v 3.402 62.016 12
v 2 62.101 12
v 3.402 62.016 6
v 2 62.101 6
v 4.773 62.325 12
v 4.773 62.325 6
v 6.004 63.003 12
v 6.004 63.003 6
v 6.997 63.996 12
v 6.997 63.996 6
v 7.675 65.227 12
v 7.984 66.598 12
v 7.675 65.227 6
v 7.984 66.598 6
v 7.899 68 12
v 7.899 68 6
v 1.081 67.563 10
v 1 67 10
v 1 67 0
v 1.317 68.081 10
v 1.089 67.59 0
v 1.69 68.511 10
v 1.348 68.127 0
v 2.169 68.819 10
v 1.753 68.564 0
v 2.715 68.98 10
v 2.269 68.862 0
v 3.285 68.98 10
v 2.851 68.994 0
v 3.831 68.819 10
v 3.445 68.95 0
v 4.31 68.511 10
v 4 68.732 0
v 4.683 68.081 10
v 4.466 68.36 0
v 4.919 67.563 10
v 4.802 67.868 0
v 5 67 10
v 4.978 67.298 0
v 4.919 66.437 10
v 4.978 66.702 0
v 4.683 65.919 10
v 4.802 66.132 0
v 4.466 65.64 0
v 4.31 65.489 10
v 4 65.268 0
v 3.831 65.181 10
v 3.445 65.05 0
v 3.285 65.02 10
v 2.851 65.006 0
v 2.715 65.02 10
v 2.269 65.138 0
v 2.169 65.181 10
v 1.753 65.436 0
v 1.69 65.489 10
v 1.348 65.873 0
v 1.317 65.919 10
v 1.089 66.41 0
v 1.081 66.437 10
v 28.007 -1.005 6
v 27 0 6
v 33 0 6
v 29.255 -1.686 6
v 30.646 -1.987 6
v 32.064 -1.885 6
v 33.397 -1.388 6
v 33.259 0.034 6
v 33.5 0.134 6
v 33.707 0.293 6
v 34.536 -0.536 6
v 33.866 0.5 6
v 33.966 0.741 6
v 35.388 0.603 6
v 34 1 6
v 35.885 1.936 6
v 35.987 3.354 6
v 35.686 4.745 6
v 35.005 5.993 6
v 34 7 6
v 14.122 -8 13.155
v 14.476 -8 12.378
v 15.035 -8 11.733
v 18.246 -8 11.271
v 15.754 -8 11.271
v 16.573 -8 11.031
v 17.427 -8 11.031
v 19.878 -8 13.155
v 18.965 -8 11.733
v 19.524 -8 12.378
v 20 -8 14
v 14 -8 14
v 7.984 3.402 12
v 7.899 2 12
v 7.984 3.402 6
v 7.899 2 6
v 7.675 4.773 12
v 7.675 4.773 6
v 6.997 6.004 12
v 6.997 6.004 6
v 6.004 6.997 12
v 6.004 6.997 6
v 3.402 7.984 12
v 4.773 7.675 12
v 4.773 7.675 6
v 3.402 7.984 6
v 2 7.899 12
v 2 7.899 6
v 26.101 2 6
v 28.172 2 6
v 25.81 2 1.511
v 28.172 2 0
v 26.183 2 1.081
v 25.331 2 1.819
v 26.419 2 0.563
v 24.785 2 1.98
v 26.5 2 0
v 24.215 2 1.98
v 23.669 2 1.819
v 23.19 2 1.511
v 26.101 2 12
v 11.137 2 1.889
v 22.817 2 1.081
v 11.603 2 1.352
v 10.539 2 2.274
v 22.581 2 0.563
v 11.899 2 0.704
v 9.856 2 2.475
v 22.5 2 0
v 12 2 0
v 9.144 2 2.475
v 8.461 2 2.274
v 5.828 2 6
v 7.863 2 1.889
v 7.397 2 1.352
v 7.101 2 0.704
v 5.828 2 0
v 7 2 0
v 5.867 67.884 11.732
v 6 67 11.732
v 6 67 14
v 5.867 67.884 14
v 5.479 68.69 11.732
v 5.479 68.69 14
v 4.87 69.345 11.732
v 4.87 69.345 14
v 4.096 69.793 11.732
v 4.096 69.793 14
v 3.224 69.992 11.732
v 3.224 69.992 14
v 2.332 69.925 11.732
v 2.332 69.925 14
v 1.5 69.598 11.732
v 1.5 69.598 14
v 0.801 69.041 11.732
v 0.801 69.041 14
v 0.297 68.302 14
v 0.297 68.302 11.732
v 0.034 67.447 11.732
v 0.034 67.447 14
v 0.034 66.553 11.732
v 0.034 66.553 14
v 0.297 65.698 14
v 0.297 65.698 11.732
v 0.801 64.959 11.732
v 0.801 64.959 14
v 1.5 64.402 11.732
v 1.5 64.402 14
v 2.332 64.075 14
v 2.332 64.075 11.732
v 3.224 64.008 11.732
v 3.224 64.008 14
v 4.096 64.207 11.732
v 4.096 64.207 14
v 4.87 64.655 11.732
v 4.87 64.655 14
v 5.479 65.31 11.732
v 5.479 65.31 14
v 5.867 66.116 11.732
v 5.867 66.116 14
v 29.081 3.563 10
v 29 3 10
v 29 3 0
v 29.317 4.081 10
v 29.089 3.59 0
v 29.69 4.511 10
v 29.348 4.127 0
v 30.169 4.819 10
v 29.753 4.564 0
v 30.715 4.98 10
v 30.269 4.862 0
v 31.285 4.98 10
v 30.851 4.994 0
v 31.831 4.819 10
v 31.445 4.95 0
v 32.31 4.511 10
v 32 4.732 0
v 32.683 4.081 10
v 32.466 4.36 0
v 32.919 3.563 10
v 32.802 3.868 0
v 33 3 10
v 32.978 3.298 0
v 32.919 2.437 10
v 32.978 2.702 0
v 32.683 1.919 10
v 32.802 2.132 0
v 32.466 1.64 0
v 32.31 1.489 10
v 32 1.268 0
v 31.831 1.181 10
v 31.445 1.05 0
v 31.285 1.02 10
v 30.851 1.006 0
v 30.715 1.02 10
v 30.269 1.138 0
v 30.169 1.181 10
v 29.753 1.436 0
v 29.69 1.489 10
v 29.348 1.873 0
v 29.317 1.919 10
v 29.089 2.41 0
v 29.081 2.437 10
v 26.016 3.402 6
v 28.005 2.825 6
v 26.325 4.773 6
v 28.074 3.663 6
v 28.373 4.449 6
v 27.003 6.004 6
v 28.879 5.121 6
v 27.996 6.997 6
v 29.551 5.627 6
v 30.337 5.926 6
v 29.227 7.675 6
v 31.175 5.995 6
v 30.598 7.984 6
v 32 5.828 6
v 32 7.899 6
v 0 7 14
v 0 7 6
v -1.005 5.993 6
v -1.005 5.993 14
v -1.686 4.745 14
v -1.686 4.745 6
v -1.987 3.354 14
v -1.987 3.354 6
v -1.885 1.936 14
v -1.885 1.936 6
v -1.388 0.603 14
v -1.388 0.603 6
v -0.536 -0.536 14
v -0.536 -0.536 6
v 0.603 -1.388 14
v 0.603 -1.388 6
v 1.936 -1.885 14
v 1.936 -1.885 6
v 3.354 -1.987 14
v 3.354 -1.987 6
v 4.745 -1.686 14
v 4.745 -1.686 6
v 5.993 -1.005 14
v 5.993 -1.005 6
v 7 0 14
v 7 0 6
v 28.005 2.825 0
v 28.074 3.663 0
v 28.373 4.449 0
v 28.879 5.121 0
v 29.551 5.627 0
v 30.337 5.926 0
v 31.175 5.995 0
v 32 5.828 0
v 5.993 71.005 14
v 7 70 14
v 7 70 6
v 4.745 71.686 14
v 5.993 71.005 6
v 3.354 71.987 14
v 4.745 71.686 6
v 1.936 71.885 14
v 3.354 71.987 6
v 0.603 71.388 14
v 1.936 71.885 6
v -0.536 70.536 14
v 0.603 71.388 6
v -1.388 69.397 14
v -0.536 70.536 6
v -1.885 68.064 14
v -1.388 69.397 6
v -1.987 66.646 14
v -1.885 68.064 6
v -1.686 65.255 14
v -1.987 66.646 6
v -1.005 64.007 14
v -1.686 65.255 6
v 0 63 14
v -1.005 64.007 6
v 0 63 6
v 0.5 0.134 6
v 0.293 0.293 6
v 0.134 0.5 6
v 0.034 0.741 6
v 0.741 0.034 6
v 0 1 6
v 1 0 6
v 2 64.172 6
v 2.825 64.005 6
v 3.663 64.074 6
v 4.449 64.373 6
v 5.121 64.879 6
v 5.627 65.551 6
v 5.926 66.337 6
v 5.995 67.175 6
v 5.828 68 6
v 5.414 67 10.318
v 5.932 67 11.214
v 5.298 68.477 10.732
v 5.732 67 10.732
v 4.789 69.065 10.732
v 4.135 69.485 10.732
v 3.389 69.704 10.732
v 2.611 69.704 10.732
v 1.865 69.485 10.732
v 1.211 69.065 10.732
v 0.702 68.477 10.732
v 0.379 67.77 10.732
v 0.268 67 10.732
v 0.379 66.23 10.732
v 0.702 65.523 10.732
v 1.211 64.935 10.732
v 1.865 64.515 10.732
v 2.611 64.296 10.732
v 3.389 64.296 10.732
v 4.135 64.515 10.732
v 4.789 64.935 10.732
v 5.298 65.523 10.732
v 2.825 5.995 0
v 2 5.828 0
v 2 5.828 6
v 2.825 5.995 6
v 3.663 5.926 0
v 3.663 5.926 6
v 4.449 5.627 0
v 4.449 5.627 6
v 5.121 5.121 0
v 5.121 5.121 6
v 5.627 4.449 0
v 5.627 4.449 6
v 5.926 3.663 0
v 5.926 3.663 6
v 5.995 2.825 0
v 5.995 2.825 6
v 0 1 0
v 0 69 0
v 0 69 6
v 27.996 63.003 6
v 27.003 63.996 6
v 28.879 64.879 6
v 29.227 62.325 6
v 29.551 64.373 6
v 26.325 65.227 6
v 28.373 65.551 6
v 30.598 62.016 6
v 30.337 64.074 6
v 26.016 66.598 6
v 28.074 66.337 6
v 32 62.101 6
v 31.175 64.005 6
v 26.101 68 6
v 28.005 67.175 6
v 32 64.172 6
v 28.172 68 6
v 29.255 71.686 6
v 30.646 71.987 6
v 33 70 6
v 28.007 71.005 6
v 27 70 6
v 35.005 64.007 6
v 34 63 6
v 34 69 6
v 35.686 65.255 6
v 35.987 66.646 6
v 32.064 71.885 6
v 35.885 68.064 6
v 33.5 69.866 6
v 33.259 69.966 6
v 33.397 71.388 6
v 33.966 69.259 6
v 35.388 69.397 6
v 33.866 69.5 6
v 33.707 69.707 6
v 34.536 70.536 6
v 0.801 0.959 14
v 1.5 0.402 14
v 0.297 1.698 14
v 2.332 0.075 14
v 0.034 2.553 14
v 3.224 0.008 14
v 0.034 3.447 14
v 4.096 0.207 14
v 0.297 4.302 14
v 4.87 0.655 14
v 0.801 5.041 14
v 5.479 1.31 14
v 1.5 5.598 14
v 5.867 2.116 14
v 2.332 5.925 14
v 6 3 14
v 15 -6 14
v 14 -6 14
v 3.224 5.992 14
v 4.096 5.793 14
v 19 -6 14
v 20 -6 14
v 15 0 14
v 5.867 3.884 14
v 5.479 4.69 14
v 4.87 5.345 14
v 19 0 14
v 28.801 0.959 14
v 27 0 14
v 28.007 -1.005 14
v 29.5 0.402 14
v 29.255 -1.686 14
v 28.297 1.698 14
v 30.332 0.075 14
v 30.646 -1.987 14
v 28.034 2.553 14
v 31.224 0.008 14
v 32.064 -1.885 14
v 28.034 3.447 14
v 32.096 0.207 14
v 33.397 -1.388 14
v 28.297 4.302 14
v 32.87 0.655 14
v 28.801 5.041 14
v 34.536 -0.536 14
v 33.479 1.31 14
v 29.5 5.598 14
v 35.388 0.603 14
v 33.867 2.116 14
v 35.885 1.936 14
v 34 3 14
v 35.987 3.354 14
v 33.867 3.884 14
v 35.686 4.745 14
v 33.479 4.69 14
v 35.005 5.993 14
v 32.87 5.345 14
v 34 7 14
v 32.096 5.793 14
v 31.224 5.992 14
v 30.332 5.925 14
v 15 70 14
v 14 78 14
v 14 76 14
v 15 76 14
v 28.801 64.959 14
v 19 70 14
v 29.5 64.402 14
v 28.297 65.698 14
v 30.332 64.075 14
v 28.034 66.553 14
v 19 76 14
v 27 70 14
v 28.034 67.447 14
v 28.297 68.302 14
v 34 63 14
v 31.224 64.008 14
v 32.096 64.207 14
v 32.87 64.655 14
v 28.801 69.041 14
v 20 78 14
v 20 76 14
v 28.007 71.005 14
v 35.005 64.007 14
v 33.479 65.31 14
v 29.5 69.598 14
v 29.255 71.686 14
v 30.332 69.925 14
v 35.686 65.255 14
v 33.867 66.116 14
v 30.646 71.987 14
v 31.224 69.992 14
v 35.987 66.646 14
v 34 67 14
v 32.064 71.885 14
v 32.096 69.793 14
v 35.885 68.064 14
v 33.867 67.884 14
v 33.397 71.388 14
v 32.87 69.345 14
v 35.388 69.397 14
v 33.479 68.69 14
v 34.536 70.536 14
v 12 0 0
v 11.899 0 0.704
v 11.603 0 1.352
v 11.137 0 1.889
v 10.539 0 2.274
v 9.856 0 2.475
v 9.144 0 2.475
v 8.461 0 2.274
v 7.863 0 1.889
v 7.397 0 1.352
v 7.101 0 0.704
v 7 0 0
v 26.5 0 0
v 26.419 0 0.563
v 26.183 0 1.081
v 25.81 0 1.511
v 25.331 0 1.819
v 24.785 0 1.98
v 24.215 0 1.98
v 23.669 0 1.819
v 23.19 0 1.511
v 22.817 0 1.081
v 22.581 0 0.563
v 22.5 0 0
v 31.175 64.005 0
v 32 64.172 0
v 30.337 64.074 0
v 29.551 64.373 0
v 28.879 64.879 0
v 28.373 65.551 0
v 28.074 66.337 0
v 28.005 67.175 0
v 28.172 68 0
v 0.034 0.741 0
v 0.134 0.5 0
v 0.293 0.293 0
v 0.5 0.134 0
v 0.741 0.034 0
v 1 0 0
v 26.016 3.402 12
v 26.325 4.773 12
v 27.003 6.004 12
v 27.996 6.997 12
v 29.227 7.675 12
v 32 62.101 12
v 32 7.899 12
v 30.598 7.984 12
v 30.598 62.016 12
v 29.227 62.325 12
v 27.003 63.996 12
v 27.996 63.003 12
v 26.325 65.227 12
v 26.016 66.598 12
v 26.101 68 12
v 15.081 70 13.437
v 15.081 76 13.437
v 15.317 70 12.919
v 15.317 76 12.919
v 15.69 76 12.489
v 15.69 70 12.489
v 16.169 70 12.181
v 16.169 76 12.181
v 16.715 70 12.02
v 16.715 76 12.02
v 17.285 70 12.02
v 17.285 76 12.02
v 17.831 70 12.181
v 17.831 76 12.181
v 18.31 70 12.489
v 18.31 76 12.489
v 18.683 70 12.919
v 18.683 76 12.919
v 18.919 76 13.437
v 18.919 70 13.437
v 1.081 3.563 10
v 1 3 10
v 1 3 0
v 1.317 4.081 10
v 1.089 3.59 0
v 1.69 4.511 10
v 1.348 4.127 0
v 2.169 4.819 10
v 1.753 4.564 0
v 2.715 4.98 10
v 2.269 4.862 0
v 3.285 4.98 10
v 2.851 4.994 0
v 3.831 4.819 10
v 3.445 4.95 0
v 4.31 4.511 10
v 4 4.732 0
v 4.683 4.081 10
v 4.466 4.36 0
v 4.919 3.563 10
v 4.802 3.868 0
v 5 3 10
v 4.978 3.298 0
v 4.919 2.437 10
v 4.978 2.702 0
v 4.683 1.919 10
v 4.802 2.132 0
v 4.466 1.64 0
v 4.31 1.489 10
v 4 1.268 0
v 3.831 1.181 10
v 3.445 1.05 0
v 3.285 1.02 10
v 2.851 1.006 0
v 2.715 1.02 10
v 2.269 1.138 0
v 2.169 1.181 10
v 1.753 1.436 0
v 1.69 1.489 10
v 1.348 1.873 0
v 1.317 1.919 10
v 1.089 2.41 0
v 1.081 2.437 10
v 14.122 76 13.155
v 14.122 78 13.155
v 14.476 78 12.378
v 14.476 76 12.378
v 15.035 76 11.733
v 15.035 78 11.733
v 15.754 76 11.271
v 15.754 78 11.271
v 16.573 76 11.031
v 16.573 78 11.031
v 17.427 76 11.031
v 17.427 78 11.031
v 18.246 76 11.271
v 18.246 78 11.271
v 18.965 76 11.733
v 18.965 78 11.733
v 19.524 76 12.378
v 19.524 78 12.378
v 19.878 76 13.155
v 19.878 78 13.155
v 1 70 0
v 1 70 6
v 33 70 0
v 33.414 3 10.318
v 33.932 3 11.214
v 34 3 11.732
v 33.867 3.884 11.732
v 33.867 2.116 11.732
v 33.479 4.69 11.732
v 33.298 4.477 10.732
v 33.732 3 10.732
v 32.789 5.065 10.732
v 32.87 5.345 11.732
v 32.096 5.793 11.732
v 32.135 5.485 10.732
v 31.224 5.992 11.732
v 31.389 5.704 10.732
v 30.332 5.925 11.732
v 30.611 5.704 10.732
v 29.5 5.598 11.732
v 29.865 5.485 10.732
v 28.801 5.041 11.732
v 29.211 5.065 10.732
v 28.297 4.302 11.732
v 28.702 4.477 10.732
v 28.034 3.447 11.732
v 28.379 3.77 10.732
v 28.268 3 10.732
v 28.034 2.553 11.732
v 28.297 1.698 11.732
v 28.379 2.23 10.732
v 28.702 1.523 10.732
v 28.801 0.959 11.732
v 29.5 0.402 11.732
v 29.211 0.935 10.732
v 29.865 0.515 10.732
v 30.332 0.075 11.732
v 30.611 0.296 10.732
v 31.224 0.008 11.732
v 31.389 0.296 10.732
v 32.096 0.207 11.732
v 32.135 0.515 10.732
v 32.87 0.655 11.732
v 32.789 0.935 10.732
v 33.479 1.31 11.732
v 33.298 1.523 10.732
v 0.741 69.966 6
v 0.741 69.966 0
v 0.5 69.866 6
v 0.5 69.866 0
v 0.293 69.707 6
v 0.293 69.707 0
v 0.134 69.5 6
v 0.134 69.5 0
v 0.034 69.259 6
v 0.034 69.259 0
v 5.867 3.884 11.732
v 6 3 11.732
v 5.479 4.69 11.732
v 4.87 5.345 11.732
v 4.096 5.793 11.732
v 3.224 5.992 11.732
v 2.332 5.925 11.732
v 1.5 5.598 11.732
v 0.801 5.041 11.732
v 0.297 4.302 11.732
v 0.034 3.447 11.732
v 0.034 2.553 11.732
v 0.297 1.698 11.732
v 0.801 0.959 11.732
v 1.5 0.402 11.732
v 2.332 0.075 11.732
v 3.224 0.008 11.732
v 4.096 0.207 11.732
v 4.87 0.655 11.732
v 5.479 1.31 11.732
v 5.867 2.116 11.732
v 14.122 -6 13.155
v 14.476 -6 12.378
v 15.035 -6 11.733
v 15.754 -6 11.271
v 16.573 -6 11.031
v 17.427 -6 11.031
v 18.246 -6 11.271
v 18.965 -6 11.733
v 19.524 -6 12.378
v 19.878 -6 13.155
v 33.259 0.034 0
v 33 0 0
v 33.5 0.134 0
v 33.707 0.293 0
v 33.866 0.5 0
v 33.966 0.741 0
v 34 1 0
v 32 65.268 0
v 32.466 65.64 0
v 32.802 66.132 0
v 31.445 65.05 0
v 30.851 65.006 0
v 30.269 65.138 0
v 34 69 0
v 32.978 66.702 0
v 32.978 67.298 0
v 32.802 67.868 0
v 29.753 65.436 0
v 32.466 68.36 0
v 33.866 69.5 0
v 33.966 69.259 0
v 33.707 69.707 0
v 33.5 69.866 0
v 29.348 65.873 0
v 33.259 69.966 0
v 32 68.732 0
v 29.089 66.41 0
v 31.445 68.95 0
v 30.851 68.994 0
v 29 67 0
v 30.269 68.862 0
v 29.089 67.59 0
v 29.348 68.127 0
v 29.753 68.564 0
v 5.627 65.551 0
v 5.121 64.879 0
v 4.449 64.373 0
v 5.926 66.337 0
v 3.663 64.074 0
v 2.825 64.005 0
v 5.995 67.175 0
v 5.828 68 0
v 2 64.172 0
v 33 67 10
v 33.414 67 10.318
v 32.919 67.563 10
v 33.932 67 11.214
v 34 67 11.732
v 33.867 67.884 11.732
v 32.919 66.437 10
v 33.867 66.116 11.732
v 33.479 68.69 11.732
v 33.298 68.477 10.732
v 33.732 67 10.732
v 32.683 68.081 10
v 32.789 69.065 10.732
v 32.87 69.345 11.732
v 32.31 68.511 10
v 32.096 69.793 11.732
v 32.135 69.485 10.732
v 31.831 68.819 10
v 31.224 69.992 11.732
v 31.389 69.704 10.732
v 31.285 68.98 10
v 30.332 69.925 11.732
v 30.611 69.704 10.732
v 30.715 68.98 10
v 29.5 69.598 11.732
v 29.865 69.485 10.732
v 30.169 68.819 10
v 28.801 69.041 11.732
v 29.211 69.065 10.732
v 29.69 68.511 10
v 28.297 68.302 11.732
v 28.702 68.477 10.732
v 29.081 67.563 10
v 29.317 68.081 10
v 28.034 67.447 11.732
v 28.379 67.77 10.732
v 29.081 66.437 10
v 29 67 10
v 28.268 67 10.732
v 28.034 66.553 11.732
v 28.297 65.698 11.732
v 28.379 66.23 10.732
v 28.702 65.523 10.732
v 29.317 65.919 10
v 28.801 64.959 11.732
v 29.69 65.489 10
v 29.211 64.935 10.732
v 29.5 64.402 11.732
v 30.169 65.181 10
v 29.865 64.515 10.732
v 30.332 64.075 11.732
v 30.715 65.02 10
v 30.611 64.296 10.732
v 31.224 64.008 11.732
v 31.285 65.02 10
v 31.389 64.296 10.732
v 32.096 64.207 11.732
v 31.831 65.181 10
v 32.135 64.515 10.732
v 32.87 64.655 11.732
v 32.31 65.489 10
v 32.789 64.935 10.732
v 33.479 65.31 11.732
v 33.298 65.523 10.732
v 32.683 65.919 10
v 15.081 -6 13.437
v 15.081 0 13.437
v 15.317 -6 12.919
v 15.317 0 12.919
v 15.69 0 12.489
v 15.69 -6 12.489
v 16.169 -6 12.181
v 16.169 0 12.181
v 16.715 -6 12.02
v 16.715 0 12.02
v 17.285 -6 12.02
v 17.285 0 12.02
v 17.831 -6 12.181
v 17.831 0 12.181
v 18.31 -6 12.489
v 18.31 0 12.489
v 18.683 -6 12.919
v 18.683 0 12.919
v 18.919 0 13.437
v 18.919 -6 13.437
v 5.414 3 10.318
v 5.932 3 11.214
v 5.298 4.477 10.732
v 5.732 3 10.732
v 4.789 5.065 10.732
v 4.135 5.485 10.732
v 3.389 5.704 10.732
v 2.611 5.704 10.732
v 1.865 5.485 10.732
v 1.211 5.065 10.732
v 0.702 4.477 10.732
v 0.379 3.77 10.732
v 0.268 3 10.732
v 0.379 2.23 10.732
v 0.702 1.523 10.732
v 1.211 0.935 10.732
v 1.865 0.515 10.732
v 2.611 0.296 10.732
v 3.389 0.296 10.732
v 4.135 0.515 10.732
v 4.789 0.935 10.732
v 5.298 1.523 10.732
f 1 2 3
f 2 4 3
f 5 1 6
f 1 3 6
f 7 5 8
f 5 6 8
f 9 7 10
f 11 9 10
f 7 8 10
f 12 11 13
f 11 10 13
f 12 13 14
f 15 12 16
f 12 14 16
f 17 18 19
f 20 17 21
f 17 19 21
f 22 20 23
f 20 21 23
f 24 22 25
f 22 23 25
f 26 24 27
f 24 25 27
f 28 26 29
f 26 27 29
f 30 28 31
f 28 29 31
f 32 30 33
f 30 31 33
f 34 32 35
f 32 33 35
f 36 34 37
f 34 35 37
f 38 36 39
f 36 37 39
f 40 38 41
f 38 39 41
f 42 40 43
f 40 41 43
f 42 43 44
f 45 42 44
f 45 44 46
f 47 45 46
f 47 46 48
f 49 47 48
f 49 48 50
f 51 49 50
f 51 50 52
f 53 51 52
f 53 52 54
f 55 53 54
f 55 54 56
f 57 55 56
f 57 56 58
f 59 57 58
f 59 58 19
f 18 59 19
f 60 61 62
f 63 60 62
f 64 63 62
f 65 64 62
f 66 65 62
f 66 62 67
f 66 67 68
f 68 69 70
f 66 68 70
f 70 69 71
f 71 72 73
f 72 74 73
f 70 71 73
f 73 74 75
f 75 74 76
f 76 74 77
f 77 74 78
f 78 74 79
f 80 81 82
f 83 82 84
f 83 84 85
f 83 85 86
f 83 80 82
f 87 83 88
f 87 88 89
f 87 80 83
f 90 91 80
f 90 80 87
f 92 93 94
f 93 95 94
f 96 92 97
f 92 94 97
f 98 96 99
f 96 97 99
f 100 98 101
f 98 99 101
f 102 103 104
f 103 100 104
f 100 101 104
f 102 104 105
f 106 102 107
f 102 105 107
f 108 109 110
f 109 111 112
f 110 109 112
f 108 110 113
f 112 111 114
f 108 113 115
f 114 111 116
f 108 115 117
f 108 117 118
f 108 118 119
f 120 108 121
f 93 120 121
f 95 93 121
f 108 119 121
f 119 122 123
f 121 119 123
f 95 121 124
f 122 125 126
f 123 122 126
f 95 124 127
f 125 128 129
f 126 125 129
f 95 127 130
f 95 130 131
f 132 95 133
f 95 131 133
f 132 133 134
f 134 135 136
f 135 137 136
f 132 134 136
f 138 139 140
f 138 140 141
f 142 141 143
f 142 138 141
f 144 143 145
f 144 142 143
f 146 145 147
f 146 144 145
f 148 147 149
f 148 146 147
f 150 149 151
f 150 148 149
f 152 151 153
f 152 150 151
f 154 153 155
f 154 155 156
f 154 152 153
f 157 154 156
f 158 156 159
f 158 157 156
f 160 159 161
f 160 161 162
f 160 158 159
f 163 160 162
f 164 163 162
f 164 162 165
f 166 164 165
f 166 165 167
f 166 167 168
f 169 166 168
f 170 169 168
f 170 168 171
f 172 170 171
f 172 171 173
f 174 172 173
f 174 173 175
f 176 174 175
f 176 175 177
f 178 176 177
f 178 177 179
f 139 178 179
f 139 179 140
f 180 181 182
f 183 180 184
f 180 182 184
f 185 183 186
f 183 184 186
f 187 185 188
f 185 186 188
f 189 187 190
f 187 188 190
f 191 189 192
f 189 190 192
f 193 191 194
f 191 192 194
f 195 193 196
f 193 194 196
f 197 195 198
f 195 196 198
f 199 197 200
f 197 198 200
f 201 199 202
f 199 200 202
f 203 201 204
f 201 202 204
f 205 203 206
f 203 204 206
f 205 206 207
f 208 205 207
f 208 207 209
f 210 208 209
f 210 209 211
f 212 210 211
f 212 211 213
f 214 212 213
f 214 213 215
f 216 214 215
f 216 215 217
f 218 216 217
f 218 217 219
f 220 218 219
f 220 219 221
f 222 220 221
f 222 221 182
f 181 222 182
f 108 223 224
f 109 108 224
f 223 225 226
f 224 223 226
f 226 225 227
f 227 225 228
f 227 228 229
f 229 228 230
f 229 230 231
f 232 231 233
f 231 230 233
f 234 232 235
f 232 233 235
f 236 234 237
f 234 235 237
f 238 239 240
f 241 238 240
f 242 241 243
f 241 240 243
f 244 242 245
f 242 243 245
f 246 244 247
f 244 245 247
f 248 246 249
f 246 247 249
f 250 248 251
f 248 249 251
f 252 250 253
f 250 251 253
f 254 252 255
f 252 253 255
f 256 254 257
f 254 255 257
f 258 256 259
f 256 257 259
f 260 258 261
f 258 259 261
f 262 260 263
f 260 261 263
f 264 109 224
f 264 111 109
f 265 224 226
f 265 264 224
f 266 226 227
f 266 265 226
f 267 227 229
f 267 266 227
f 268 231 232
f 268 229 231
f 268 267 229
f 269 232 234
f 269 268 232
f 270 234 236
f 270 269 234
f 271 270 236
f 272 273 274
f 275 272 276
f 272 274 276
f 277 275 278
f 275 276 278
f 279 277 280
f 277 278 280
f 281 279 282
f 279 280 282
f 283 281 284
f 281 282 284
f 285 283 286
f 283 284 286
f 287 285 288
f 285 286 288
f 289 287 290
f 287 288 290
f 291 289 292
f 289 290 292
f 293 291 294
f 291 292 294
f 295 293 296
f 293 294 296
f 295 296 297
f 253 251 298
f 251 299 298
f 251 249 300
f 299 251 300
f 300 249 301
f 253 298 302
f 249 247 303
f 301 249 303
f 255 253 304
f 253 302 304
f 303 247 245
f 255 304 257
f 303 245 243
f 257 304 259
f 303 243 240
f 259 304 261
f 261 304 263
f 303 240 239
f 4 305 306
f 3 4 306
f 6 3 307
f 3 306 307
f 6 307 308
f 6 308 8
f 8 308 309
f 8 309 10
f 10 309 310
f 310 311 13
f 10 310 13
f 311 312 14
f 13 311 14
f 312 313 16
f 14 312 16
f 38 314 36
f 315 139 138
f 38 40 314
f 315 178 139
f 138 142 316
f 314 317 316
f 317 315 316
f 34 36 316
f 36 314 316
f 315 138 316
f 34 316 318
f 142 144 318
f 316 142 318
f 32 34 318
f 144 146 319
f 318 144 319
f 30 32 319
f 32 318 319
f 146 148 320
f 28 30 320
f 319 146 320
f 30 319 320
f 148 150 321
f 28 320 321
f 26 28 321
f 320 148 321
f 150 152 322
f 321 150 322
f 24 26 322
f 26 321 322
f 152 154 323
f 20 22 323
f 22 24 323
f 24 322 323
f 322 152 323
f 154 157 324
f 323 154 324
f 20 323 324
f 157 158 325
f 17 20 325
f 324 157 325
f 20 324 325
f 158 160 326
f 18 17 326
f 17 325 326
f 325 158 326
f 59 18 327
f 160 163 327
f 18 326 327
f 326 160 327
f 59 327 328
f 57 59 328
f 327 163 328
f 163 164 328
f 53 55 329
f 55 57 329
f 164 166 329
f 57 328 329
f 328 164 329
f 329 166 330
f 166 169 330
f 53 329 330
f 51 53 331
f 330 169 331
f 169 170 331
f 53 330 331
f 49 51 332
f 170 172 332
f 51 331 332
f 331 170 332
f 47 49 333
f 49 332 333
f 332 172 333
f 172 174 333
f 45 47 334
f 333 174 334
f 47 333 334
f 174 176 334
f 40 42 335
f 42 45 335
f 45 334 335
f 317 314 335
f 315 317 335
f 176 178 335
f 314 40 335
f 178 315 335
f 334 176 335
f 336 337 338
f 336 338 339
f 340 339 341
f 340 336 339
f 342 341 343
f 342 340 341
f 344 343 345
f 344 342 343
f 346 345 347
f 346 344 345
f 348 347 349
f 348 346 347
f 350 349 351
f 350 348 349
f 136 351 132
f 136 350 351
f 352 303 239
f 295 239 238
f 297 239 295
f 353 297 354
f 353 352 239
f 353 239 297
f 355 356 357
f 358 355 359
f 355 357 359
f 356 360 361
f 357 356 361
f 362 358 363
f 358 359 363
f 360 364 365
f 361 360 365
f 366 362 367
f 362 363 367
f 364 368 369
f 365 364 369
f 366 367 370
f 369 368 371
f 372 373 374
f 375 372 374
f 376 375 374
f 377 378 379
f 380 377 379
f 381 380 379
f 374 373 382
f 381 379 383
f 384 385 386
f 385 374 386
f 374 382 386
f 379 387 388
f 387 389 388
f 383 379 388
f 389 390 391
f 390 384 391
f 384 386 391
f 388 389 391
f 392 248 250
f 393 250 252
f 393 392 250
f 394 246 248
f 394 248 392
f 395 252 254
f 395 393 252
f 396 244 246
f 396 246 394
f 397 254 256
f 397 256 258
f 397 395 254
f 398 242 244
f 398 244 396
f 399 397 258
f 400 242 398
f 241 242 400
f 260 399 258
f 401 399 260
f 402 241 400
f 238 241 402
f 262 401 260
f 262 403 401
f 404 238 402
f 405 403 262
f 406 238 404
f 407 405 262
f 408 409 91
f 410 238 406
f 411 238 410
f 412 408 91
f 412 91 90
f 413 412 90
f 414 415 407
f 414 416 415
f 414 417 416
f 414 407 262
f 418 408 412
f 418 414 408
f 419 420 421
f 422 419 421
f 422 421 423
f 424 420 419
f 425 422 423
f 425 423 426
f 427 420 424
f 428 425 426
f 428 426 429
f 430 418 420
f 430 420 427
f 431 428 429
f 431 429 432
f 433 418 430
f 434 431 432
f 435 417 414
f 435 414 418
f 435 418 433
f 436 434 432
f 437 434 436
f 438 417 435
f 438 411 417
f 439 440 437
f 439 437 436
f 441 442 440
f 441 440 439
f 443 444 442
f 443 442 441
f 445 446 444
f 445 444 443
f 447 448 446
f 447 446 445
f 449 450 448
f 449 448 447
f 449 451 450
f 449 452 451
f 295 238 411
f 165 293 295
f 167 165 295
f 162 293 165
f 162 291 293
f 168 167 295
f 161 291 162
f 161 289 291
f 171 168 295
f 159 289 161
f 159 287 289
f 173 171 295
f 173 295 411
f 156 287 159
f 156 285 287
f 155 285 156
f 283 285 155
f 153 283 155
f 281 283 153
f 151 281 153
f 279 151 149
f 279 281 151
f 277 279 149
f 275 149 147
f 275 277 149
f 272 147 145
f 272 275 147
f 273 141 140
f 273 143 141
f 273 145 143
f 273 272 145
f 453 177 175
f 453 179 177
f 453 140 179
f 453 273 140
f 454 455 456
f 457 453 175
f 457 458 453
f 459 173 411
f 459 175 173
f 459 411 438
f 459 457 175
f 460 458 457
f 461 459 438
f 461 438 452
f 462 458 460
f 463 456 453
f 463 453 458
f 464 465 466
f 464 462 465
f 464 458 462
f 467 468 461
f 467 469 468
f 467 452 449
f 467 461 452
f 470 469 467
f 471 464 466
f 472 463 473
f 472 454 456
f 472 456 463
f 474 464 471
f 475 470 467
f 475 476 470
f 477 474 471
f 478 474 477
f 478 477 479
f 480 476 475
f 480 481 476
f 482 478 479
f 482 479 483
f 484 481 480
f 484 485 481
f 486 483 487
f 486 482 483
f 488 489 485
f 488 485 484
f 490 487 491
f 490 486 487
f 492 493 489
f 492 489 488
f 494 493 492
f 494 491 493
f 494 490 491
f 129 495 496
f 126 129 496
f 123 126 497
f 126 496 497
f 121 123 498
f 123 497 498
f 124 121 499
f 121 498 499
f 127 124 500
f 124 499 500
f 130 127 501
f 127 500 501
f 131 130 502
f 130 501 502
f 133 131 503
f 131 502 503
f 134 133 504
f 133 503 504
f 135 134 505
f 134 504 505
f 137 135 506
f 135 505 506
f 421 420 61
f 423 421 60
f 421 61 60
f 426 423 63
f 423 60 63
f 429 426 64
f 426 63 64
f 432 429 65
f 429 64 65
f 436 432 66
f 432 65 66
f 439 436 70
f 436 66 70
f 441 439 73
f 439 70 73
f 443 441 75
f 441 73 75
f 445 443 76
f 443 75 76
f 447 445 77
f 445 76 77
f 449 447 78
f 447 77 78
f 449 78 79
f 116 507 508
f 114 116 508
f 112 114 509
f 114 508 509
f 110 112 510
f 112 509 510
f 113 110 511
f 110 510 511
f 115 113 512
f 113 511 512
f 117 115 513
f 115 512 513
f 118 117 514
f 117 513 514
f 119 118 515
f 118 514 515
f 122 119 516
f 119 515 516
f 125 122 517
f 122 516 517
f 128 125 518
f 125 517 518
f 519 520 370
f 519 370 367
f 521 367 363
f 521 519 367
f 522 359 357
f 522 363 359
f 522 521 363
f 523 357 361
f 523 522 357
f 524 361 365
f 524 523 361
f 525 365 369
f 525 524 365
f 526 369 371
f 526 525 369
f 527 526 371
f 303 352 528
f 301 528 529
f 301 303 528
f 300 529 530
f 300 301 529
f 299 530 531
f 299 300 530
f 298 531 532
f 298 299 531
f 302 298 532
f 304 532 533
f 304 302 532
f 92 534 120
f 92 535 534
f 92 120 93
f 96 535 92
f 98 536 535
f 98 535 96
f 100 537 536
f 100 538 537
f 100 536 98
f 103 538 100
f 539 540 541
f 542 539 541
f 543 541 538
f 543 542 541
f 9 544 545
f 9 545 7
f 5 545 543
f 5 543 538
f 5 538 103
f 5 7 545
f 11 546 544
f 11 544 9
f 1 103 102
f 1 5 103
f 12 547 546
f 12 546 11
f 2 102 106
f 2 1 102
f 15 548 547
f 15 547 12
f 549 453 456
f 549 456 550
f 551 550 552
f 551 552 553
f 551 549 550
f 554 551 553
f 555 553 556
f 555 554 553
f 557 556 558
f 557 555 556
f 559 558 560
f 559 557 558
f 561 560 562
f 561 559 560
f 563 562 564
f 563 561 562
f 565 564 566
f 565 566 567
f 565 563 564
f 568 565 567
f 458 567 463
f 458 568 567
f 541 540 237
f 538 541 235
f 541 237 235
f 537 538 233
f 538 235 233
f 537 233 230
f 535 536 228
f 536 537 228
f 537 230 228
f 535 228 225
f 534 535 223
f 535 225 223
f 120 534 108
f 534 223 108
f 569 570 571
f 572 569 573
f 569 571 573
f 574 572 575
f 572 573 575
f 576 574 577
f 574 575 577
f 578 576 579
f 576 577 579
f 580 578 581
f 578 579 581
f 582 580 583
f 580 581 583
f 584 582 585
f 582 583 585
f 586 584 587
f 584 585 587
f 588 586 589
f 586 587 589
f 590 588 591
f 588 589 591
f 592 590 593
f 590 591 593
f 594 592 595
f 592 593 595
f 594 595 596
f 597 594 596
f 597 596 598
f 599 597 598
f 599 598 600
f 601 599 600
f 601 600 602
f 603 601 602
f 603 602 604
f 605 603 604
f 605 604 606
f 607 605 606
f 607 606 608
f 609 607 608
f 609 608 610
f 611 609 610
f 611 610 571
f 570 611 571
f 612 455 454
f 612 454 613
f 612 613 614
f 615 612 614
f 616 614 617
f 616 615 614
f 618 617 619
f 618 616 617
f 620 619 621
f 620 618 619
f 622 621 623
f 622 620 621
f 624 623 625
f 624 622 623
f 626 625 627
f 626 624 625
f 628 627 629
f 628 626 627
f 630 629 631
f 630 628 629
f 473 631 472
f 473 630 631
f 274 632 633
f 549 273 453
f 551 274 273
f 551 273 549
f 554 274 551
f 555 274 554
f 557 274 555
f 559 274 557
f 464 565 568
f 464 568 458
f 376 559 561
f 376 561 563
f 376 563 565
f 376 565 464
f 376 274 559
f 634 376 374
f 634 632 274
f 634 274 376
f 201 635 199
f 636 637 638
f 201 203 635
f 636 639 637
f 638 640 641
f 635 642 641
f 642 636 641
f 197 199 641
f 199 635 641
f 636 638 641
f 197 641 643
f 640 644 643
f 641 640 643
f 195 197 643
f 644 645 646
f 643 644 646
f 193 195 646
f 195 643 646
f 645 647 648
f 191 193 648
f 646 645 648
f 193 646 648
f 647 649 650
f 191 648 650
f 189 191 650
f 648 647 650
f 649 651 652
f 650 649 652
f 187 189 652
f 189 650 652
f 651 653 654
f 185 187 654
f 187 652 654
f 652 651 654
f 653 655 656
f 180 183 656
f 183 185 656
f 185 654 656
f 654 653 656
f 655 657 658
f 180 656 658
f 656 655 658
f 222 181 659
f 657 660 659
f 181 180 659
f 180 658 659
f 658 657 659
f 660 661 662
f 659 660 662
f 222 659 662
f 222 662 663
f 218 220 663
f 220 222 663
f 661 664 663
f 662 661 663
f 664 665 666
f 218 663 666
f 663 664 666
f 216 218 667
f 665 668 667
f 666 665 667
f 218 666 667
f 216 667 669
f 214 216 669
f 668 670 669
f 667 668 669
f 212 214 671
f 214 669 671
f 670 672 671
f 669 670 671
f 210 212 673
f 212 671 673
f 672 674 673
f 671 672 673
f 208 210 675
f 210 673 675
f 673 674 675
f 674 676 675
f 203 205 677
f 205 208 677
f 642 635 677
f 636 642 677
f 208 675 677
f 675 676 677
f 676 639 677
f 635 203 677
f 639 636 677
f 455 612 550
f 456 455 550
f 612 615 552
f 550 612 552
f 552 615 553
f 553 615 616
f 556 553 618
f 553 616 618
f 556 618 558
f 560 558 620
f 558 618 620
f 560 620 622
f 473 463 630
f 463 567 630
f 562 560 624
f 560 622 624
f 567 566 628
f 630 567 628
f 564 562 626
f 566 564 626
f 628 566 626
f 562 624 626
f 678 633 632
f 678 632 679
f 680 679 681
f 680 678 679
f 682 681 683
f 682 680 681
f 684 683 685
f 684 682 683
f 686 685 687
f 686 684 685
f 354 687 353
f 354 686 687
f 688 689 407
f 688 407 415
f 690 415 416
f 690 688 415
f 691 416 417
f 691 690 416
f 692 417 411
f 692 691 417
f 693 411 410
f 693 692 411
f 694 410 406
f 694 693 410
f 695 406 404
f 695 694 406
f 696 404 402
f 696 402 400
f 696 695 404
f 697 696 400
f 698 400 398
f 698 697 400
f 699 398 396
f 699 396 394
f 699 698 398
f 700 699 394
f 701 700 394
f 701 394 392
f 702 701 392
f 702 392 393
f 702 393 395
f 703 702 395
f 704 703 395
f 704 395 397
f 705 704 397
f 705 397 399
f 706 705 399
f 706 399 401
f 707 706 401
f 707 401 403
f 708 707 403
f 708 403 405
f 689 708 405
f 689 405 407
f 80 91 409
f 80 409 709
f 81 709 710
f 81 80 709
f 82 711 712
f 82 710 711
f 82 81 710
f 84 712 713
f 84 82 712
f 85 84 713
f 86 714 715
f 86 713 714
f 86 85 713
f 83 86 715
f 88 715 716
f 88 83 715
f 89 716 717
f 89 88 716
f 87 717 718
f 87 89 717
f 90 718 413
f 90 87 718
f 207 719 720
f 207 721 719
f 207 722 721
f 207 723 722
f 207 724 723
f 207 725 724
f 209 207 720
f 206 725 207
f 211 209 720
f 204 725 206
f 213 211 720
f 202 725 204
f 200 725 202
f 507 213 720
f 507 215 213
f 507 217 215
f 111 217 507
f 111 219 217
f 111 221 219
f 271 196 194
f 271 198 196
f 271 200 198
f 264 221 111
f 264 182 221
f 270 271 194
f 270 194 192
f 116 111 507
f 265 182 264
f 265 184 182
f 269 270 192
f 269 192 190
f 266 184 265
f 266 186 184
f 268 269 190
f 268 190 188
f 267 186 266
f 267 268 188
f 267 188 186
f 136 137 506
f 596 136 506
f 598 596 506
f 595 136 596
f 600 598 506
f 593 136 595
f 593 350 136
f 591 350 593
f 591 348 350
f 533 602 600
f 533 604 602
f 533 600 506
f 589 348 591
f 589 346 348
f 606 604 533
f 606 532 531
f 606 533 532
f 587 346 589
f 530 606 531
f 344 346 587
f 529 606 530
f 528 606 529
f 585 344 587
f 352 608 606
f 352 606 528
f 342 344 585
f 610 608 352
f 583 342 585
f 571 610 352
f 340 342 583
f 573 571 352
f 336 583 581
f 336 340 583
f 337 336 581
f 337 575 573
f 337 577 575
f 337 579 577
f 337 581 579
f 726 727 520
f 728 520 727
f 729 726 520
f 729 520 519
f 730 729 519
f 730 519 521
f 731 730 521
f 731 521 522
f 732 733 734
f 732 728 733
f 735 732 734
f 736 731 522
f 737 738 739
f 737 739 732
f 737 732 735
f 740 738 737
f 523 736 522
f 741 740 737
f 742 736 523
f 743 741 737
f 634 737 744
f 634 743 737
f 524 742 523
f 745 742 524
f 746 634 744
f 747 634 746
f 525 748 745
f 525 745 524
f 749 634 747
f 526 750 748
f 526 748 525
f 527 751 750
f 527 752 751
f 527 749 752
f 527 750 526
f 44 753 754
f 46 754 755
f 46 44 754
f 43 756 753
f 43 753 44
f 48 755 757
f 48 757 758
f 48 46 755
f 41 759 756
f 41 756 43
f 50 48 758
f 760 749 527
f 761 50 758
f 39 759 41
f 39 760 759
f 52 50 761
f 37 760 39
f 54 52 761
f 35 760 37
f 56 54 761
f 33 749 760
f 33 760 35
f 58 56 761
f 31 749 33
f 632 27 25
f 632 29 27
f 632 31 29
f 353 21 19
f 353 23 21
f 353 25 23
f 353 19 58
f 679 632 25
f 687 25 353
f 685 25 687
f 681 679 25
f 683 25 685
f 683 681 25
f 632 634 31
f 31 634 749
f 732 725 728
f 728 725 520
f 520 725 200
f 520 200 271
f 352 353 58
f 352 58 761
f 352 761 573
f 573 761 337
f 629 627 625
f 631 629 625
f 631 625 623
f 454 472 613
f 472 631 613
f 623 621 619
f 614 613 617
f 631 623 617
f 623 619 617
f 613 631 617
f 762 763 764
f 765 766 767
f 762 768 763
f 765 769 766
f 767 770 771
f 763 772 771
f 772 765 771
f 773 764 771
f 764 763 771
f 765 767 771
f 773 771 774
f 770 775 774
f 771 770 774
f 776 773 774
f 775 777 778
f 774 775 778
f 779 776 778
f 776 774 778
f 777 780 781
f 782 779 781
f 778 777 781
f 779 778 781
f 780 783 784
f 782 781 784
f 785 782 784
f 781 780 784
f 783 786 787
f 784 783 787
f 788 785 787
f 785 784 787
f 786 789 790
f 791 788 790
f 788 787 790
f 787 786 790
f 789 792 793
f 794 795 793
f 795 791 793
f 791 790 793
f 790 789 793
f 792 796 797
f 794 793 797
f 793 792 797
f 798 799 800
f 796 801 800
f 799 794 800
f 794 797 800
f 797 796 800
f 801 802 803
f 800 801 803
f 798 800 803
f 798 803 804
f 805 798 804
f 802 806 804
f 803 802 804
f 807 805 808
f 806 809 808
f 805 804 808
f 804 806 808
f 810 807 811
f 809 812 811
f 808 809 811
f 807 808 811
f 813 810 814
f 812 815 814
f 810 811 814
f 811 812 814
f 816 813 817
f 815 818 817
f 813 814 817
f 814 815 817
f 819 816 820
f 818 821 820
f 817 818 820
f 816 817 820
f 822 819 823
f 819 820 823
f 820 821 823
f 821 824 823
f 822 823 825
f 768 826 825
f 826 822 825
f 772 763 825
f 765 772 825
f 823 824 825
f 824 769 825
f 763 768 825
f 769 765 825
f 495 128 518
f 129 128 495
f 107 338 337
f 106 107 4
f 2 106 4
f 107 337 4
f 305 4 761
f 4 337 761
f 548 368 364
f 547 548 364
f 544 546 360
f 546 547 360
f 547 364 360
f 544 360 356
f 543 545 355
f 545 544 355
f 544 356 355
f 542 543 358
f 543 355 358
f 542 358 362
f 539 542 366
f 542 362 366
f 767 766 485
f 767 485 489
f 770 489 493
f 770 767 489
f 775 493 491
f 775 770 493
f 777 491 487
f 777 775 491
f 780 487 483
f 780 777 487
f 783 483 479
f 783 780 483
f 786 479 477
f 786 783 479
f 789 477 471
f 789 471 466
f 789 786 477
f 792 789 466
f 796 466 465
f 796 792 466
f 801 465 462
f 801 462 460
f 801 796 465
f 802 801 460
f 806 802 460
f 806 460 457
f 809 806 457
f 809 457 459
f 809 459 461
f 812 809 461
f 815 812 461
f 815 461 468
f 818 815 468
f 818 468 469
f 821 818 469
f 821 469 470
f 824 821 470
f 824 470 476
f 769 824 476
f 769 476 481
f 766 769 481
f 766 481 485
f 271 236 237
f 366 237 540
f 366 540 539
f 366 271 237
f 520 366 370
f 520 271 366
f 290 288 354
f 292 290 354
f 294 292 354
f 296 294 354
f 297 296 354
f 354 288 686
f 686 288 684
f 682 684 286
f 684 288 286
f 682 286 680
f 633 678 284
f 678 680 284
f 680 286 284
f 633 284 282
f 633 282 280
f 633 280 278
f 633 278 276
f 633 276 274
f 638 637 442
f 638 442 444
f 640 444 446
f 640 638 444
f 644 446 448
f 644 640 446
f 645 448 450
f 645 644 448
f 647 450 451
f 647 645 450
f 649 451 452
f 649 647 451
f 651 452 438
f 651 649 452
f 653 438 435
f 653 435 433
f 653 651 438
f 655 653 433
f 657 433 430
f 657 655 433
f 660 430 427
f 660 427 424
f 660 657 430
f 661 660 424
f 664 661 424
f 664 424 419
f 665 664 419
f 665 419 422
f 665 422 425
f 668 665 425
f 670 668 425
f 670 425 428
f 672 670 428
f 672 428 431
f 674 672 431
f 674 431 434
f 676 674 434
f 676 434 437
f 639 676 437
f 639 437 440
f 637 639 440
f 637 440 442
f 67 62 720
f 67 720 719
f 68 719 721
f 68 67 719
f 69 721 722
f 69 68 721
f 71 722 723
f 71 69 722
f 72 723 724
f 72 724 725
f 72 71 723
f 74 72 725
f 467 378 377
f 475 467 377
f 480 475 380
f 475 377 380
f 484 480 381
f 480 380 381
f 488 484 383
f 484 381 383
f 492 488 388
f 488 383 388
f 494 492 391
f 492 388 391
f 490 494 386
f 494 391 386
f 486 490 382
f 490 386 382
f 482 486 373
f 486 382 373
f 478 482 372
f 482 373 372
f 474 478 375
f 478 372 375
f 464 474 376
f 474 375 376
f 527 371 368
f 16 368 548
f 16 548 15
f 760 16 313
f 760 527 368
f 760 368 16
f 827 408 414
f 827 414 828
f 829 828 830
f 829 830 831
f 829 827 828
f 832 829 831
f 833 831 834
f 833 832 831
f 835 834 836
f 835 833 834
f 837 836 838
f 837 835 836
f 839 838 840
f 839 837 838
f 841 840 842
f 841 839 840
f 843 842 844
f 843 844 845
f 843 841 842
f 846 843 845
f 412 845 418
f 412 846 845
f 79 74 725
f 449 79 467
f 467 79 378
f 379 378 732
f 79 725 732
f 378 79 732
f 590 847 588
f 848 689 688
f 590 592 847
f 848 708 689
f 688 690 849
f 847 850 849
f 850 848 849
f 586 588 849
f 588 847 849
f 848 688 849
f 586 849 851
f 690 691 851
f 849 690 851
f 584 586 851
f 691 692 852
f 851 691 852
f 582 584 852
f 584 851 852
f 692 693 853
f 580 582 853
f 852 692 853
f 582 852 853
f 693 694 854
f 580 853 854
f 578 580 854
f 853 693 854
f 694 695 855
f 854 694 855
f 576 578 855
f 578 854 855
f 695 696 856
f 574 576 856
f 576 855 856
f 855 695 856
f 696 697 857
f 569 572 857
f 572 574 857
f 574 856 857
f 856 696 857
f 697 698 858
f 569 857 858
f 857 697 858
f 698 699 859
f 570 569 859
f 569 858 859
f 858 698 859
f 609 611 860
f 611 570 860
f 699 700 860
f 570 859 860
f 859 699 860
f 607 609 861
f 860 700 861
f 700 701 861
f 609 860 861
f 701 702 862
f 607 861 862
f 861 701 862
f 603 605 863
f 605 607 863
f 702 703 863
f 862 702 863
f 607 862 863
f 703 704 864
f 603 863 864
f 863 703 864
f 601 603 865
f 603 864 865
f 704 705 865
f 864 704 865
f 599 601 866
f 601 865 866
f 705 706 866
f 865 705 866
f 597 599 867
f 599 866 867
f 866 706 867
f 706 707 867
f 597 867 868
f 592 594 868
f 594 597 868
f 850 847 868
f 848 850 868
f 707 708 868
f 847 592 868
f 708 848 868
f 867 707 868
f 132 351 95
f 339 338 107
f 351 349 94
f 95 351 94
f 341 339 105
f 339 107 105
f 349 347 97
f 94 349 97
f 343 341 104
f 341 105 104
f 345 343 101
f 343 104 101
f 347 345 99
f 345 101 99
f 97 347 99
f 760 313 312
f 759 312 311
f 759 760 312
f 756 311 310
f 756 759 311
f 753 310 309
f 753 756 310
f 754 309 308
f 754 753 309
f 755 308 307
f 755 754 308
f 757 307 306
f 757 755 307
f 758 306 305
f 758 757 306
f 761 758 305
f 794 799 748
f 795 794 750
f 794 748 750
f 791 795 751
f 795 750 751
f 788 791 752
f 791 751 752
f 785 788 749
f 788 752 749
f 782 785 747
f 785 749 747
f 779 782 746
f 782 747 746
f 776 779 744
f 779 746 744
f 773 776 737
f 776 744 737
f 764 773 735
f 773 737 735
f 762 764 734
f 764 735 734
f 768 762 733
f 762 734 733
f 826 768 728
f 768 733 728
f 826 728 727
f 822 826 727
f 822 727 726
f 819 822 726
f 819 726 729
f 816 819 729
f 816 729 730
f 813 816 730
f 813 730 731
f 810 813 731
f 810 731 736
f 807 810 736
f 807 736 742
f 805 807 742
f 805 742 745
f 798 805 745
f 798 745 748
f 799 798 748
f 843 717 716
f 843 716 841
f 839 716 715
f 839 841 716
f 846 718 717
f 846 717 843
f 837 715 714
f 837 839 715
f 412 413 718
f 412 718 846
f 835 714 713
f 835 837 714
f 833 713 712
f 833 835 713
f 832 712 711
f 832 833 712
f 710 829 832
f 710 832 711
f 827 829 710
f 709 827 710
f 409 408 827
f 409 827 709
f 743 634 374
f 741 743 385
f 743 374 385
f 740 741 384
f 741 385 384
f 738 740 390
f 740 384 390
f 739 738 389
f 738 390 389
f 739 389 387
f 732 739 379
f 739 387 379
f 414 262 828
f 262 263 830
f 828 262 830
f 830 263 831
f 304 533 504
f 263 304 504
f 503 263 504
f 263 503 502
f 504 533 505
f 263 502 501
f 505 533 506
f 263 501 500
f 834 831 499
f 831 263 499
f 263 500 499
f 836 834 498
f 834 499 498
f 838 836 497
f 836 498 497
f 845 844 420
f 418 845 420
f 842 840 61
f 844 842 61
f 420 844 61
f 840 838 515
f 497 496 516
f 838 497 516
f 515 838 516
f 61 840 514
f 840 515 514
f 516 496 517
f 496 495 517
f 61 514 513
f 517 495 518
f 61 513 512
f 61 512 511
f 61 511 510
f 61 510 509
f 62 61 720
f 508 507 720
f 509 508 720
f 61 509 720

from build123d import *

# Parameters (mm, degrees)
SKETCH1_W           = 34
SKETCH1_H           = 70
BOSS_EXTRUDE1_DEPTH = 14
SKETCH2_W           = 30
SKETCH2_H           = 66
CUT_EXTRUDE1_DEPTH  = 12
SKETCH3_R           = 3
BOSS_EXTRUDE2_DEPTH = 12
SKETCH4_R           = 2
CUT_EXTRUDE2_DEPTH  = 80.069589603
CUT_EXTRUDE4_REACH  = 81.07
SKETCH6_R           = 2.5
SKETCH6_R_2         = 2
FILLET1_R           = 1
BOSS_EXTRUDE3_START = -8
SKETCH7_R           = 5
SKETCH7_R_2         = 3
BOSS_EXTRUDE3_DEPTH = 8
CUT_EXTRUDE7_START  = -4
SKETCH8_R           = 3
CUT_EXTRUDE7_DEPTH  = 4
BOSS_EXTRUDE4_DEPTH = 8
CUT_EXTRUDE8_START  = -8
CUT_EXTRUDE8_DEPTH  = 6
BOSS_EXTRUDE5_START = 8
BOSS_EXTRUDE5_DEPTH = 8
CUT_EXTRUDE9_START  = -2
CUT_EXTRUDE9_DEPTH  = 6
FILLET3_R           = 2


with BuildPart() as part:
    # Sketch1 → Boss-Extrude1 (new body)
    with BuildSketch(Plane.XY):
        with Locations((17, 35)):
            Rectangle(SKETCH1_W, SKETCH1_H)
    extrude(amount=BOSS_EXTRUDE1_DEPTH)

    # Sketch2 → Cut-Extrude1 (cut)
    with BuildSketch(Plane(origin=(0, 0, 0), x_dir=(-1, 0, 0), z_dir=(0, 0, -1))):
        with Locations((-17, 35)):
            Rectangle(SKETCH2_W, SKETCH2_H)
    extrude(amount=-CUT_EXTRUDE1_DEPTH, mode=Mode.SUBTRACT)

    # Sketch3 → Boss-Extrude2 (add)
    with BuildSketch(Plane(origin=(0, 0, 0), x_dir=(-1, 0, 0), z_dir=(0, 0, -1))):
        with Locations((-31, 67)):
            Circle(SKETCH3_R)
        with Locations((-3, 67)):
            Circle(SKETCH3_R)
        with Locations((-3, 3)):
            Circle(SKETCH3_R)
        with Locations((-31, 3)):
            Circle(SKETCH3_R)
    extrude(amount=-BOSS_EXTRUDE2_DEPTH)

    # Sketch4 → Cut-Extrude2 (cut, through all)
    with BuildSketch(Plane(origin=(0, 0, 0), x_dir=(-1, 0, 0), z_dir=(0, 0, -1))):
        with Locations((-3, 67)):
            Circle(SKETCH4_R)
        with Locations((-31, 67)):
            Circle(SKETCH4_R)
        with Locations((-3, 3)):
            Circle(SKETCH4_R)
        with Locations((-31, 3)):
            Circle(SKETCH4_R)
    extrude(amount=-CUT_EXTRUDE2_DEPTH, mode=Mode.SUBTRACT)

    # Sketch6 → Cut-Extrude4 (cut, up to next)
    with BuildSketch(Plane.XZ, mode=Mode.PRIVATE) as cut_extrude4_sk1:
        with Locations((9.5, 0)):
            Circle(SKETCH6_R)
    cut_extrude4_tool1 = extrude(cut_extrude4_sk1.sketch, amount=-CUT_EXTRUDE4_REACH, mode=Mode.PRIVATE) & part.part
    # Sketch6 → Cut-Extrude4 (cut, up to next)
    with BuildSketch(Plane.XZ, mode=Mode.PRIVATE) as cut_extrude4_sk2:
        with Locations((24.5, 0)):
            Circle(SKETCH6_R_2)
    cut_extrude4_tool2 = extrude(cut_extrude4_sk2.sketch, amount=-CUT_EXTRUDE4_REACH, mode=Mode.PRIVATE) & part.part
    add(cut_extrude4_tool1.solids().sort_by_distance((9.5, 0, 0))[0], mode=Mode.SUBTRACT)
    add(cut_extrude4_tool2.solids().sort_by_distance((24.5, 0, 0))[0], mode=Mode.SUBTRACT)

    # Fillet1
    fillet1_edges = [part.edges().sort_by_distance(p)[0] for p in [
        (0, 70, 7),
        (34, 70, 7),
        (34, 0, 7),
        (0, 0, 7),
    ]]
    fillet(fillet1_edges, radius=FILLET1_R)

    # Sketch7 → Boss-Extrude3 (add)
    # profile 1 of 4: a face of its own
    with BuildSketch(Plane.XY.offset(14).offset(BOSS_EXTRUDE3_START)):
        with Locations((31, 67)):
            Circle(SKETCH7_R)
        with Locations((31, 67)):
            Circle(SKETCH7_R_2, mode=Mode.SUBTRACT)
    # profile 2 of 4: a face of its own
    with BuildSketch(Plane.XY.offset(14).offset(BOSS_EXTRUDE3_START)):
        with Locations((3, 67)):
            Circle(SKETCH7_R)
        with Locations((3, 67)):
            Circle(SKETCH7_R_2, mode=Mode.SUBTRACT)
    # profile 3 of 4: a face of its own
    with BuildSketch(Plane.XY.offset(14).offset(BOSS_EXTRUDE3_START)):
        with Locations((31, 3)):
            Circle(SKETCH7_R)
        with Locations((31, 3)):
            Circle(SKETCH7_R_2, mode=Mode.SUBTRACT)
    # profile 4 of 4: a face of its own
    with BuildSketch(Plane.XY.offset(14).offset(BOSS_EXTRUDE3_START)):
        with Locations((3, 3)):
            Circle(SKETCH7_R)
        with Locations((3, 3)):
            Circle(SKETCH7_R_2, mode=Mode.SUBTRACT)
    extrude(amount=BOSS_EXTRUDE3_DEPTH)

    # Sketch8 → Cut-Extrude7 (cut)
    with BuildSketch(Plane.XY.offset(14).offset(CUT_EXTRUDE7_START)):
        with Locations((3, 3)):
            Circle(SKETCH8_R)
        with Locations((31, 3)):
            Circle(SKETCH8_R)
        with Locations((31, 67)):
            Circle(SKETCH8_R)
        with Locations((3, 67)):
            Circle(SKETCH8_R)
    extrude(amount=CUT_EXTRUDE7_DEPTH, mode=Mode.SUBTRACT)

    # Sketch9 → Boss-Extrude4 (add)
    with BuildSketch(Plane(origin=(0, 70, 0), x_dir=(1, 0, 0), z_dir=(0, 1, 0))):
        with BuildLine():
            Line((20, -14), (14, -14))
            ThreePointArc((14, -14), (17, -11), (20, -14))
        make_face()
    extrude(amount=BOSS_EXTRUDE4_DEPTH)

    # Sketch10 → Cut-Extrude8 (cut)
    with BuildSketch(Plane(origin=(0, 78, 0), x_dir=(1, 0, 0), z_dir=(0, 1, 0)).offset(CUT_EXTRUDE8_START)):
        with BuildLine():
            Line((19, -14), (20, -14))
            ThreePointArc((20, -14), (17, -11), (14, -14))
            Line((14, -14), (15, -14))
            ThreePointArc((15, -14), (17, -12), (19, -14))
        make_face()
    extrude(amount=CUT_EXTRUDE8_DEPTH, mode=Mode.SUBTRACT)

    # Sketch11 → Boss-Extrude5 (add)
    with BuildSketch(Plane.XZ.offset(BOSS_EXTRUDE5_START)):
        with BuildLine():
            Line((20, 14), (14, 14))
            ThreePointArc((14, 14), (17, 11), (20, 14))
        make_face()
    extrude(amount=-BOSS_EXTRUDE5_DEPTH)

    # Sketch12 → Cut-Extrude9 (cut)
    with BuildSketch(Plane.XZ.offset(8).offset(CUT_EXTRUDE9_START)):
        with BuildLine():
            Line((14, 14), (15, 14))
            ThreePointArc((15, 14), (17, 12), (19, 14))
            Line((19, 14), (20, 14))
            ThreePointArc((20, 14), (17, 11), (14, 14))
        make_face()
    extrude(amount=-CUT_EXTRUDE9_DEPTH, mode=Mode.SUBTRACT)

    # Fillet3
    # the kernel refuses this fillet: 2 mm, written as the material it adds along each edge
    with BuildSketch(Plane(origin=(3, 67, 10), x_dir=(1, 0, 0), z_dir=(0, -1, 0))) as fillet3_piece_1_section:
        with BuildLine():
            CenterArc((1, 1.732050808), FILLET3_R, 300, 60)
            Line((2, 0), (2.02, -0.034641016))
            ThreePointArc((2.02, -0.034641016), (2.5, -0.04), (3, -0.04))
            Line((3, -0.04), (3.04, 0))
            Line((3.04, 0), (3.04, 1.732050808))
            Line((3.04, 1.732050808), (3, 1.732050808))
        make_face()
    fillet3_piece_1 = revolve(axis=Axis((3, 67, 10), (0, 0, 1)), mode=Mode.PRIVATE)
    fillet3_piece_1 = fillet3_piece_1 - Plane(origin=(3, 67, 10.721085361), x_dir=(-1, 0, 0), z_dir=(0, 0, -1)) * Cylinder(2, 13, mode=Mode.PRIVATE)
    add(fillet3_piece_1)
    with BuildSketch(Plane(origin=(31, 67, 10), x_dir=(1, 0, 0), z_dir=(0, -1, 0))) as fillet3_piece_2_section:
        with BuildLine():
            CenterArc((1, 1.732050808), FILLET3_R, 300, 60)
            Line((2, 0), (2.02, -0.034641016))
            ThreePointArc((2.02, -0.034641016), (2.5, -0.04), (3, -0.04))
            Line((3, -0.04), (3.04, 0))
            Line((3.04, 0), (3.04, 1.732050808))
            Line((3.04, 1.732050808), (3, 1.732050808))
        make_face()
    fillet3_piece_2 = revolve(axis=Axis((31, 67, 10), (0, 0, 1)), mode=Mode.PRIVATE)
    fillet3_piece_2 = fillet3_piece_2 - Plane(origin=(31, 67, 10.721085361), x_dir=(-1, 0, 0), z_dir=(0, 0, -1)) * Cylinder(2, 13, mode=Mode.PRIVATE)
    add(fillet3_piece_2)
    with BuildSketch(Plane(origin=(31, 3, 10), x_dir=(1, 0, 0), z_dir=(0, -1, 0))) as fillet3_piece_3_section:
        with BuildLine():
            CenterArc((1, 1.732050808), FILLET3_R, 300, 60)
            Line((2, 0), (2.02, -0.034641016))
            ThreePointArc((2.02, -0.034641016), (2.5, -0.04), (3, -0.04))
            Line((3, -0.04), (3.04, 0))
            Line((3.04, 0), (3.04, 1.732050808))
            Line((3.04, 1.732050808), (3, 1.732050808))
        make_face()
    fillet3_piece_3 = revolve(axis=Axis((31, 3, 10), (0, 0, 1)), mode=Mode.PRIVATE)
    fillet3_piece_3 = fillet3_piece_3 - Plane(origin=(31, 3, 10.721085361), x_dir=(-1, 0, 0), z_dir=(0, 0, -1)) * Cylinder(2, 13, mode=Mode.PRIVATE)
    add(fillet3_piece_3)
    with BuildSketch(Plane(origin=(3, 3, 10), x_dir=(1, 0, 0), z_dir=(0, -1, 0))) as fillet3_piece_4_section:
        with BuildLine():
            CenterArc((1, 1.732050808), FILLET3_R, 300, 60)
            Line((2, 0), (2.02, -0.034641016))
            ThreePointArc((2.02, -0.034641016), (2.5, -0.04), (3, -0.04))
            Line((3, -0.04), (3.04, 0))
            Line((3.04, 0), (3.04, 1.732050808))
            Line((3.04, 1.732050808), (3, 1.732050808))
        make_face()
    fillet3_piece_4 = revolve(axis=Axis((3, 3, 10), (0, 0, 1)), mode=Mode.PRIVATE)
    fillet3_piece_4 = fillet3_piece_4 - Plane(origin=(3, 3, 10.721085361), x_dir=(-1, 0, 0), z_dir=(0, 0, -1)) * Cylinder(2, 13, mode=Mode.PRIVATE)
    add(fillet3_piece_4)


solid = part.part
